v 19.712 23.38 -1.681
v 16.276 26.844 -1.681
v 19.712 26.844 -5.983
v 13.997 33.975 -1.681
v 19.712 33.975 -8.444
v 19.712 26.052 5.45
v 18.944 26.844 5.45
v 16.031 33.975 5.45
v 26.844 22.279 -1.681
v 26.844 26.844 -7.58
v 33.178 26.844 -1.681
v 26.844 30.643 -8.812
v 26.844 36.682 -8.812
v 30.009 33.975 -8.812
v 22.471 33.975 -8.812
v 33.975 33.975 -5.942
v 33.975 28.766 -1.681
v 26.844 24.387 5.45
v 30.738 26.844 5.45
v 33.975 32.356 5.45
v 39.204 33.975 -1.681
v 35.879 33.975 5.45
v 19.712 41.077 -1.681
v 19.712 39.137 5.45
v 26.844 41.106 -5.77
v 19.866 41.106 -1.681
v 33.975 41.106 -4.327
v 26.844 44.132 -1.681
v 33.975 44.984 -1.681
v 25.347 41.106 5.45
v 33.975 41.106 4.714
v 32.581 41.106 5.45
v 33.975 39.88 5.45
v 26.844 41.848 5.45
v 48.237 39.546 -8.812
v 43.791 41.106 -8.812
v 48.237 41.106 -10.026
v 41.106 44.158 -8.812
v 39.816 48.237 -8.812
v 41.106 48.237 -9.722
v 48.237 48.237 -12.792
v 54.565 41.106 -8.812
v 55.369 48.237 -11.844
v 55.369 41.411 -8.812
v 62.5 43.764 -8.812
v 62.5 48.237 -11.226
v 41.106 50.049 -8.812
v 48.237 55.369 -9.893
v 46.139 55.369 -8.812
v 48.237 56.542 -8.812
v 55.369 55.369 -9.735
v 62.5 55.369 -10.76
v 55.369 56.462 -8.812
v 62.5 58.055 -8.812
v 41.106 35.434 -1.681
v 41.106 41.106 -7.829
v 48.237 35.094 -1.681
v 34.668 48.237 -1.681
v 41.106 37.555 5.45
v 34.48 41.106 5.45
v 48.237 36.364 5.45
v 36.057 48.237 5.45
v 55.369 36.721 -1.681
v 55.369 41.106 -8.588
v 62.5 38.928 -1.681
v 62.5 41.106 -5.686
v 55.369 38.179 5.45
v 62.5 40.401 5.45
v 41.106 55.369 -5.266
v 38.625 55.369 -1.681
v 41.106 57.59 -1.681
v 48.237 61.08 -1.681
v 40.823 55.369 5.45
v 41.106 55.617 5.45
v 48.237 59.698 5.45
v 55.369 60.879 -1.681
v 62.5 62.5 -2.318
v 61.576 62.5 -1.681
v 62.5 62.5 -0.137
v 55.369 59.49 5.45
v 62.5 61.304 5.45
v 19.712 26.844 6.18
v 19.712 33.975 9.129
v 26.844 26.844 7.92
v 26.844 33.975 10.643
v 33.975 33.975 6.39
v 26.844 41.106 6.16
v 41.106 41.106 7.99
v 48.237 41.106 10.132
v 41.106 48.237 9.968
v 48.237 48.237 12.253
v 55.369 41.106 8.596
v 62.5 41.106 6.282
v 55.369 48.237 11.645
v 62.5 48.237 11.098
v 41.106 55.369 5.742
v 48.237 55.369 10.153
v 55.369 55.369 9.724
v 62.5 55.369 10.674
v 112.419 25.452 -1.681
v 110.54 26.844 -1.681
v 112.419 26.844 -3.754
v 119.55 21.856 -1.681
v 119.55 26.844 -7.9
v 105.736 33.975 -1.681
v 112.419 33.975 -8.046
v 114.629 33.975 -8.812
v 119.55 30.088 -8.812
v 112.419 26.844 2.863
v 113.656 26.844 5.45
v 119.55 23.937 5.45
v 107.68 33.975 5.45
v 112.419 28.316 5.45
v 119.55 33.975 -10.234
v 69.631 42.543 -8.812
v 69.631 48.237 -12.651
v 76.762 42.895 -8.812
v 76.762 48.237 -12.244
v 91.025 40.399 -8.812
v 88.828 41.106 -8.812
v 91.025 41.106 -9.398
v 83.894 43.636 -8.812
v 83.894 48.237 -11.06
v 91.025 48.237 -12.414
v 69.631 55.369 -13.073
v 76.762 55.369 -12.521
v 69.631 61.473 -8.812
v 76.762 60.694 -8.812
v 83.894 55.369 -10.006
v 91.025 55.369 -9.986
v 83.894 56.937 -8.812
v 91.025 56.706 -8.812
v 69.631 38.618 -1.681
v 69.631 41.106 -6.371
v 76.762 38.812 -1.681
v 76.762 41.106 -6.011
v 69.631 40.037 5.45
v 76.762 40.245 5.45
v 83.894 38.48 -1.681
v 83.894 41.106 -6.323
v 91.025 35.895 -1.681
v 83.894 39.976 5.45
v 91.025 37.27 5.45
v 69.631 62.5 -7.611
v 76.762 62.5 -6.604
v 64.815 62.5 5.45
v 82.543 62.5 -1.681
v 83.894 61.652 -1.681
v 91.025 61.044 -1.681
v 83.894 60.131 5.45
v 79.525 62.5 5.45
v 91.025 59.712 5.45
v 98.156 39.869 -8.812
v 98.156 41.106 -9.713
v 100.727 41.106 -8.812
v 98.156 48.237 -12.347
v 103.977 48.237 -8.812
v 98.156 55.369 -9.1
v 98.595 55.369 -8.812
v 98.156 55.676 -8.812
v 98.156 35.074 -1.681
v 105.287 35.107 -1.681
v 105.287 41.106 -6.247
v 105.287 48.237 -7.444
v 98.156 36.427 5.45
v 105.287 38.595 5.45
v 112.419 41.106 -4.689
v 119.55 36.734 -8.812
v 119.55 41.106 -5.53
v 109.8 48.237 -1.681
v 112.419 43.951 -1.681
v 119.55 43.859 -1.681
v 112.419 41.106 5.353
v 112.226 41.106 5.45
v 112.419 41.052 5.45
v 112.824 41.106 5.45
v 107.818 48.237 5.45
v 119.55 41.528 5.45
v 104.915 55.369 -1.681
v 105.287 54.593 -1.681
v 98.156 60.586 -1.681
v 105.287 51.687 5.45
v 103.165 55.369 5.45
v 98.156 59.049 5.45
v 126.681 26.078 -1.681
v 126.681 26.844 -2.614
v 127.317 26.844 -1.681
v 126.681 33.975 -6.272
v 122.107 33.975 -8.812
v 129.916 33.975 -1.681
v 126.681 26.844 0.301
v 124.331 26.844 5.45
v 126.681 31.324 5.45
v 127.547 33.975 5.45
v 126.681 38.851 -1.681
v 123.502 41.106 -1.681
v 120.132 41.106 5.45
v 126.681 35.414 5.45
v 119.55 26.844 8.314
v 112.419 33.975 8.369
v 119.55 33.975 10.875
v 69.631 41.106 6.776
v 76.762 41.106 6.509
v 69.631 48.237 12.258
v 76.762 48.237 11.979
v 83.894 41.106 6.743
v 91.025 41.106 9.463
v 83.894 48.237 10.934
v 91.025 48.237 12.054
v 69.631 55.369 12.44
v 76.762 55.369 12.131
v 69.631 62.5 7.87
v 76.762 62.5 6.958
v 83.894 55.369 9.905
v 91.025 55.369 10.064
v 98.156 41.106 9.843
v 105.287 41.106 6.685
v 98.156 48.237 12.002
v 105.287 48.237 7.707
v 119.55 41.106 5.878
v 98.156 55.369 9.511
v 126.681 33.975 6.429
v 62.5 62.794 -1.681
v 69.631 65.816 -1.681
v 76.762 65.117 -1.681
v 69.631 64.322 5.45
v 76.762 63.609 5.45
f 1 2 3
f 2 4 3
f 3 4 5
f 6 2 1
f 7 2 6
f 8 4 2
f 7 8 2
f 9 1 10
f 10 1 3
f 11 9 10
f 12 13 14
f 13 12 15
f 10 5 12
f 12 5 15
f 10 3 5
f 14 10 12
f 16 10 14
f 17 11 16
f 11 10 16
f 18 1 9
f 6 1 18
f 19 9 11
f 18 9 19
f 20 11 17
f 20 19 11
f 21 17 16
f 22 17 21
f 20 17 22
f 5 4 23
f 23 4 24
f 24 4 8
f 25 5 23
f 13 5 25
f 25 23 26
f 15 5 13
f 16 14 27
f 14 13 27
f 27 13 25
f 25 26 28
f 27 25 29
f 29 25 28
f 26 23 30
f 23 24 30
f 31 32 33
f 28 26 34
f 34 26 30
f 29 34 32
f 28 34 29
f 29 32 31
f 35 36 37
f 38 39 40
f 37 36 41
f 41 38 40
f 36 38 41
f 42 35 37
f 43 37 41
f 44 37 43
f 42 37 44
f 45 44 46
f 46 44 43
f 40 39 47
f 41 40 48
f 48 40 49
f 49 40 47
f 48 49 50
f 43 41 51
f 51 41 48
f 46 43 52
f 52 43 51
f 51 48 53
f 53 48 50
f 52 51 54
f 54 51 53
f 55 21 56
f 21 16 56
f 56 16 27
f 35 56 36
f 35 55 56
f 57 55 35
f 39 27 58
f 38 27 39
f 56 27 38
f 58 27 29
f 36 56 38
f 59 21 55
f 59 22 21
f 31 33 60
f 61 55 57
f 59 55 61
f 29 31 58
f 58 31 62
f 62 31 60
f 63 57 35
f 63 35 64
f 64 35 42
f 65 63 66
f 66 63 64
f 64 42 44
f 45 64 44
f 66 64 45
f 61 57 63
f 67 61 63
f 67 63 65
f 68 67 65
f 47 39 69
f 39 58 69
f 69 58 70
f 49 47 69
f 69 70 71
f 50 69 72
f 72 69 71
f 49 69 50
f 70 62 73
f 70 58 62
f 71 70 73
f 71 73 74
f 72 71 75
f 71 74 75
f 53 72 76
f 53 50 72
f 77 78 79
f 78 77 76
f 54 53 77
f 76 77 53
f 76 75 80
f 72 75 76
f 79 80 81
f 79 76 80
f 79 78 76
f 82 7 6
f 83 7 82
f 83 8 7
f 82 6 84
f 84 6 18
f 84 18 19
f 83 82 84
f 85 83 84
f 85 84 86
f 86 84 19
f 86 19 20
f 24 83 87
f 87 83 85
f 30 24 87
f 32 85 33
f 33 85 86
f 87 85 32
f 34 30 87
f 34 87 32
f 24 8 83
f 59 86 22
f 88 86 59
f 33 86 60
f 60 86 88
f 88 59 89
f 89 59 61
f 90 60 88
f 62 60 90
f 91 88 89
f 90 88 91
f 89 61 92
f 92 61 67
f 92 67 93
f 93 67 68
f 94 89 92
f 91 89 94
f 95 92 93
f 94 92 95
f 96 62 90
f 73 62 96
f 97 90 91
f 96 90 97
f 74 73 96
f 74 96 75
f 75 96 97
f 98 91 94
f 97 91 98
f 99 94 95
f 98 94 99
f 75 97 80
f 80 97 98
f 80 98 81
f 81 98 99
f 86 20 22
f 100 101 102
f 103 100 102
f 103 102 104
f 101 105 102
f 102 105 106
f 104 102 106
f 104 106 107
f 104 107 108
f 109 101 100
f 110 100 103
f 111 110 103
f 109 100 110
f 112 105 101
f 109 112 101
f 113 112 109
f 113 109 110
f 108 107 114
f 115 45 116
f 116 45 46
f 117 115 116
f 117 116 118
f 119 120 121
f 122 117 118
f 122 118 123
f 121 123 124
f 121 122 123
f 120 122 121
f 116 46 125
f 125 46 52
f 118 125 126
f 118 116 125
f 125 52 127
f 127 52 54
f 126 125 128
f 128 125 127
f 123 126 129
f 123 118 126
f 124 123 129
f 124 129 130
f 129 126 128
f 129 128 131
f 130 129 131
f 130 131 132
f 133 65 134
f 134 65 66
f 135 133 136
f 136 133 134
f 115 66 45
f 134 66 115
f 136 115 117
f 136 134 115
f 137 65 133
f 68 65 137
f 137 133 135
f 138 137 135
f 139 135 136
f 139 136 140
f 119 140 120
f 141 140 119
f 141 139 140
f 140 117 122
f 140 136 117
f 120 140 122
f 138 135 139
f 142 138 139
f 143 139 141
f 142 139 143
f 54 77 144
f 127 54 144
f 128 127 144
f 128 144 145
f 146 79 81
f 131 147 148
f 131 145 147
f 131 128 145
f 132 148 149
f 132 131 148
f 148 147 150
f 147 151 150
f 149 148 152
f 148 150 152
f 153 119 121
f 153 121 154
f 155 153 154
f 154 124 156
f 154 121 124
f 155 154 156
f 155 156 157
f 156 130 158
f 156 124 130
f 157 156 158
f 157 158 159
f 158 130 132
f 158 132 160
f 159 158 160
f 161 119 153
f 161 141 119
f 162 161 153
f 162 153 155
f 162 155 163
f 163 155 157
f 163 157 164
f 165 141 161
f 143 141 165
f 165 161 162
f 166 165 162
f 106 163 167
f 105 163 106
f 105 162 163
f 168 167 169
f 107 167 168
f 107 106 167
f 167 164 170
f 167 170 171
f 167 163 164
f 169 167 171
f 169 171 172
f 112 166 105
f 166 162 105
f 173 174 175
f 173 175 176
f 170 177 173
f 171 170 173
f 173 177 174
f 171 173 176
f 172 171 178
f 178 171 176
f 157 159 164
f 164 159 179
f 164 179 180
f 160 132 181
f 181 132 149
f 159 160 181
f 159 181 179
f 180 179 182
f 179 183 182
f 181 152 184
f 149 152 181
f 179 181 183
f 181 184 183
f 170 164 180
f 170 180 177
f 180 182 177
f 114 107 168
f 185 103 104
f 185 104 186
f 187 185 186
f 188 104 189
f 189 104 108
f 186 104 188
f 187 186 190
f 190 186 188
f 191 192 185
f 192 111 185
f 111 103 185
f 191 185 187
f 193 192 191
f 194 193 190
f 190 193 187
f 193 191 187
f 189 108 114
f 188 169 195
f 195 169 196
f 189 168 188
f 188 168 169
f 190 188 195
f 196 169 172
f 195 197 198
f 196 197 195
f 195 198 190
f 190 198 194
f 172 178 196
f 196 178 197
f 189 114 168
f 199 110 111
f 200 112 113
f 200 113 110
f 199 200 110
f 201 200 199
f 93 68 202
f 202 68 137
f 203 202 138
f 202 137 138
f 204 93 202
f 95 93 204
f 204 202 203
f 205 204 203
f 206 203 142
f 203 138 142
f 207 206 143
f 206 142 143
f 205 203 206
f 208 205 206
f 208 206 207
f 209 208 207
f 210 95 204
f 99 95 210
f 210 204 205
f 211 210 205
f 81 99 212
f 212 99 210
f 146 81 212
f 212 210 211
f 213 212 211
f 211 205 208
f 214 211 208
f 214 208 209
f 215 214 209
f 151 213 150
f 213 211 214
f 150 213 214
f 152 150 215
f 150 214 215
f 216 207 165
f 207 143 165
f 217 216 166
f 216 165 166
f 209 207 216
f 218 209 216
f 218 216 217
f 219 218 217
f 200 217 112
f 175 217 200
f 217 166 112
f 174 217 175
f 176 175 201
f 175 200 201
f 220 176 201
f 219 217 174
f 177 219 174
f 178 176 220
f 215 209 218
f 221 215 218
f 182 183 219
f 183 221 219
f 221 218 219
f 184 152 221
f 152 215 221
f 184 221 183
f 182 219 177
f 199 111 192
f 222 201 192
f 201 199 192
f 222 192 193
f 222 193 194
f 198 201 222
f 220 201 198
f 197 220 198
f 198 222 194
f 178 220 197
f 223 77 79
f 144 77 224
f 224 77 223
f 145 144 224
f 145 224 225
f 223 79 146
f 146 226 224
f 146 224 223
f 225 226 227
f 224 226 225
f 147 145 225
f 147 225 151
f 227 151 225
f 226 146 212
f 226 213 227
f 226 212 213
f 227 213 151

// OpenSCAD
/*
SomeBalls.scad
Public Domain Code
Based on Metaballs By: William A Adams 	4 June 2011

This code is a simplified implementation of the 'metaball' and uses "Marching Cubes" to register the isosurface which is the interaction of the various balls. All Cubes are tested and a joint hull is generated of each corner that lies inside the threshold  of the metaball 



*/
Resolution = 10;//[5:5:50]
MinSubdivisions=4;//[2:1:10] 
// Smaller number larger blob
Thresh1 = 1.89;// [1.5:0.01:2.5]
Diagnostic=false;
Oversize=0.2;
// List Format [[x,y,z,r],[x,y,z,r]]
//MyBallList=[[50, 50, 50, -11],[25, 5, 5, 35],[95, 5, 75, 45],[-35, 5, 75, 55]];//Threshold = 1.95
MyBallList=[ for(i=[0:4])Lotto(i)];

DrawMetaballs(vsmooth(vsmooth(MyBallList)),Thresh1);
//color(rndc())for(i=[0:8]){translate([rands(0, 125, 1)[0],rands(15, 30, 1)[0],rands(15, 35, 1)[0]])rotate([0,90,0])sphere(20,$fn=12);}


module DrawMetaballs(BallList,Threshold) {
 ColorList = [ for(i=[0:len(BallList)])rndc() ];
 
// boundary plus some extra
size=max(findMax(BallList, 0),findMax(BallList, 1),findMax(BallList,2));
DrawSubMetaballs(BallList,ColorList,Threshold,findMin(BallList, 0)-(size*Oversize),findMin(BallList, 1)-(size*Oversize),findMin(BallList, 2)-(size*Oversize),size*(Oversize*2+1)); 
    


 }
module DrawSubMetaballs(BallList,ColorList,Threshold,x,y,z,Size,i=0) {    
  //  echo(i,Size);

suma = BallField3D(x, y, z, BallList, len(BallList) - 1);
sumb = BallField3D(x + Size, y, z, BallList, len(BallList) - 1);
sumc = BallField3D(x, y + Size, z, BallList, len(BallList) - 1);
sumd = BallField3D(x + Size, y + Size, z, BallList, len(BallList) - 1);
sume = BallField3D(x, y, z + Size, BallList, len(BallList) - 1);
sumf = BallField3D(x + Size, y, z + Size, BallList, len(BallList) - 1);
sumg = BallField3D(x, y + Size, z + Size, BallList, len(BallList) - 1);
sumh = BallField3D(x + Size, y + Size, z + Size, BallList, len(BallList) - 1);
sumcolor =lim31(1, ColorField3D(x, y, z, BallList,ColorList, len(BallList) - 1));


    


// test for empty and full Cubes
 if (Size>pow(Resolution, MinSubdivisions)||i<MinSubdivisions) { 
    h=Size*0.5  ;
    DrawSubMetaballs(BallList,ColorList,Threshold,x,y,z,h,i+1);
    DrawSubMetaballs(BallList,ColorList,Threshold,x+h,y,z,h,i+1);
    DrawSubMetaballs(BallList,ColorList,Threshold,x,y+h,z,h,i+1);
    DrawSubMetaballs(BallList,ColorList,Threshold,x+h,y+h,z,h,i+1);
    
    DrawSubMetaballs(BallList,ColorList,Threshold,x,y,z+h,h,i+1);
    DrawSubMetaballs(BallList,ColorList,Threshold,x+h,y,z+h,h,i+1);
    DrawSubMetaballs(BallList,ColorList,Threshold,x,y+h,z+h,h,i+1);
    DrawSubMetaballs(BallList,ColorList,Threshold,x+h,y+h,z+h,h,i+1);
    
    }else {
    
if (  suma <= Threshold && sumb <= Threshold && sumc <= Threshold && sumd <= Threshold && sume <= Threshold && sumf <= Threshold && sumg <= Threshold && sumh <= Threshold) {if (Diagnostic){translate([x, y, z]) %cube(Size);}} 
else if ( suma > Threshold && sumb > Threshold && sumc > Threshold && sumd > Threshold && sume > Threshold && sumf > Threshold && sumg > Threshold && sumh > Threshold) {
translate([x, y, z])  color(sumcolor) cube(Size);} 


else if(Size>Resolution){ 
    h=Size*0.5  ;
    DrawSubMetaballs(BallList,ColorList,Threshold,x,y,z,h,i+1);
    DrawSubMetaballs(BallList,ColorList,Threshold,x+h,y,z,h,i+1);
    DrawSubMetaballs(BallList,ColorList,Threshold,x,y+h,z,h,i+1);
    DrawSubMetaballs(BallList,ColorList,Threshold,x+h,y+h,z,h,i+1);
    
    DrawSubMetaballs(BallList,ColorList,Threshold,x,y,z+h,h,i+1);
    DrawSubMetaballs(BallList,ColorList,Threshold,x+h,y,z+h,h,i+1);
    DrawSubMetaballs(BallList,ColorList,Threshold,x,y+h,z+h,h,i+1);
    DrawSubMetaballs(BallList,ColorList,Threshold,x+h,y+h,z+h,h,i+1);}
else { 

    // For every corner inside treshold make and mirror a corner piece, hull the lot.
   //echo(sumcolor);
    color(sumcolor)hull(){
        
        sab=inter(suma,sumb,Threshold)*Size;
sac=inter(suma,sumc,Threshold)*Size;
sae=inter(suma,sume,Threshold)*Size;
sba=inter(sumb,suma,Threshold)*Size;
sbd=inter(sumb,sumd,Threshold)*Size;
sbf=inter(sumb,sumf,Threshold)*Size;
sca=inter(sumc,suma,Threshold)*Size;
scd=inter(sumc,sumd,Threshold)*Size;
scg=inter(sumc,sumg,Threshold)*Size;
sdb=inter(sumd,sumb,Threshold)*Size;
sdc=inter(sumd,sumc,Threshold)*Size;
sdh=inter(sumd,sumh,Threshold)*Size;
sea=inter(sume,suma,Threshold)*Size;
seg=inter(sume,sumg,Threshold)*Size;
sef=inter(sume,sumf,Threshold)*Size;
sfh=inter(sumf,sumh,Threshold)*Size;
sfe=inter(sumf,sume,Threshold)*Size;
sfb=inter(sumf,sumb,Threshold)*Size;
sge=inter(sumg,sume,Threshold)*Size;
sgh=inter(sumg,sumh,Threshold)*Size;
sgc=inter(sumg,sumc,Threshold)*Size;
shg=inter(sumh,sumg,Threshold)*Size;
shf=inter(sumh,sumf,Threshold)*Size;
shd=inter(sumh,sumd,Threshold)*Size;
if (suma > Threshold){    translate([x, y, z])  Corner(sab,sac,sae);}
if (sumb > Threshold){    translate([x + Size, y, z])  Corner(-sba,sbd,sbf);}
if (sumc > Threshold){  translate([x, y + Size, z])  Corner(scd,-sca,scg);}
if (sumd > Threshold){    translate([x + Size, y + Size, z]) Corner(-sdc,-sdb,sdh);}
    
if (sume > Threshold){   translate([x, y, z + Size])  Corner(sef,seg,-sea);}
if (sumf > Threshold){   translate([x + Size, y, z + Size])  Corner(-sfe,sfh,-sfb);}
if (sumg > Threshold){    translate([x, y + Size, z + Size])  Corner(sgh,-sge,-sgc);}
if (sumh > Threshold){    translate([x + Size, y + Size, z + Size]) Corner(-shg,-shf,-shd);}
}
    }
}}




//Corner piece
module Corner(u=0.5,v=0.5,w=0.5) {scale([u,v,w])
polyhedron
    (points = [	       [0,0,0],[1,0,0],[0,1,0],[0,0,1],],      faces = [		  [0,0,1],[0,0,2],[0,0,3],[1,2,3]
		  ]
     );}
     
     function lim31(l, v) = v / len3(v) * l;
     function len3(v) = sqrt(pow(v[0], 2) + pow(v[1], 2) + pow(v[2], 2));
// Random color

function Lotto(i) = [i*36,i%2*120,0,9];

//Field function
     function ColorField3D(x, y, z, BallSack,Colorsack, i) = (i == 0) ? Powercolor(x, y, z, BallSack[0])*Colorsack[0]: Powercolor(x, y, z, BallSack[i])*Colorsack[i] + ColorField3D(x, y, z, BallSack,Colorsack, i - 1);

function Powercolor(x, y, z, Ball) = (Ball[3] / sqrt((x - Ball[0]) * (x - Ball[0]) + (y - Ball[1]) * (y - Ball[1]) + (z - Ball[2]) * (z - Ball[2])));     
function Powerball(x, y, z, Ball) = (Ball[3] / sqrt((x - Ball[0]) * (x - Ball[0]) + (y - Ball[1]) * (y - Ball[1]) + (z - Ball[2]) * (z - Ball[2])));
// Recursive Field Evaluation
function BallField3D(x, y, z, BallSack, i) = (i == 0) ? Powerball(x, y, z, BallSack[0]): Powerball(x, y, z, BallSack[i]) + BallField3D(x, y, z, BallSack, i - 1);
function rndc() = [round(rands(0, 2, 1)[0])/2, round(rands(0, 2, 1)[0])/2, round(rands(0, 2, 1)[0])/2];
     //interpolate
function inter(t,r,Threshold)=(t==r)?1:(t>Threshold)?(r<Threshold)? abs(Threshold-t)/abs(t-r) :0 :(r>Threshold)? abs(Threshold-t)/abs(t-r) :1 ;
// Recursive find min/max extremes
function findMax(v, select, i = 0) = ((i + 1) < len(v)) ? max(v[i][select] + abs(v[i][3]) + Resolution, findMax(v, select, i + 1)): v[i][select] + abs(v[i][3]) + Resolution;
function findMin(v, select, i = 0) = ((i + 1) < len(v)) ? min(v[i][select] - abs(v[i][3]) - Resolution, findMin(v, select, i + 1)): v[i][select] - abs(v[i][3]) - Resolution;
     
     
     function vsmooth(v) = [
  for(i = [0: 1 / len(v): 1]) bez2(i,v)
];
  
  function bez2(t,v) = (len(v) > 2) ? bez2(t,[
  for(i = [0: len(v) - 2]) v[i] * t + v[i + 1] * (1 - t)
]): v[0] * t + v[1] * (1 - t);
